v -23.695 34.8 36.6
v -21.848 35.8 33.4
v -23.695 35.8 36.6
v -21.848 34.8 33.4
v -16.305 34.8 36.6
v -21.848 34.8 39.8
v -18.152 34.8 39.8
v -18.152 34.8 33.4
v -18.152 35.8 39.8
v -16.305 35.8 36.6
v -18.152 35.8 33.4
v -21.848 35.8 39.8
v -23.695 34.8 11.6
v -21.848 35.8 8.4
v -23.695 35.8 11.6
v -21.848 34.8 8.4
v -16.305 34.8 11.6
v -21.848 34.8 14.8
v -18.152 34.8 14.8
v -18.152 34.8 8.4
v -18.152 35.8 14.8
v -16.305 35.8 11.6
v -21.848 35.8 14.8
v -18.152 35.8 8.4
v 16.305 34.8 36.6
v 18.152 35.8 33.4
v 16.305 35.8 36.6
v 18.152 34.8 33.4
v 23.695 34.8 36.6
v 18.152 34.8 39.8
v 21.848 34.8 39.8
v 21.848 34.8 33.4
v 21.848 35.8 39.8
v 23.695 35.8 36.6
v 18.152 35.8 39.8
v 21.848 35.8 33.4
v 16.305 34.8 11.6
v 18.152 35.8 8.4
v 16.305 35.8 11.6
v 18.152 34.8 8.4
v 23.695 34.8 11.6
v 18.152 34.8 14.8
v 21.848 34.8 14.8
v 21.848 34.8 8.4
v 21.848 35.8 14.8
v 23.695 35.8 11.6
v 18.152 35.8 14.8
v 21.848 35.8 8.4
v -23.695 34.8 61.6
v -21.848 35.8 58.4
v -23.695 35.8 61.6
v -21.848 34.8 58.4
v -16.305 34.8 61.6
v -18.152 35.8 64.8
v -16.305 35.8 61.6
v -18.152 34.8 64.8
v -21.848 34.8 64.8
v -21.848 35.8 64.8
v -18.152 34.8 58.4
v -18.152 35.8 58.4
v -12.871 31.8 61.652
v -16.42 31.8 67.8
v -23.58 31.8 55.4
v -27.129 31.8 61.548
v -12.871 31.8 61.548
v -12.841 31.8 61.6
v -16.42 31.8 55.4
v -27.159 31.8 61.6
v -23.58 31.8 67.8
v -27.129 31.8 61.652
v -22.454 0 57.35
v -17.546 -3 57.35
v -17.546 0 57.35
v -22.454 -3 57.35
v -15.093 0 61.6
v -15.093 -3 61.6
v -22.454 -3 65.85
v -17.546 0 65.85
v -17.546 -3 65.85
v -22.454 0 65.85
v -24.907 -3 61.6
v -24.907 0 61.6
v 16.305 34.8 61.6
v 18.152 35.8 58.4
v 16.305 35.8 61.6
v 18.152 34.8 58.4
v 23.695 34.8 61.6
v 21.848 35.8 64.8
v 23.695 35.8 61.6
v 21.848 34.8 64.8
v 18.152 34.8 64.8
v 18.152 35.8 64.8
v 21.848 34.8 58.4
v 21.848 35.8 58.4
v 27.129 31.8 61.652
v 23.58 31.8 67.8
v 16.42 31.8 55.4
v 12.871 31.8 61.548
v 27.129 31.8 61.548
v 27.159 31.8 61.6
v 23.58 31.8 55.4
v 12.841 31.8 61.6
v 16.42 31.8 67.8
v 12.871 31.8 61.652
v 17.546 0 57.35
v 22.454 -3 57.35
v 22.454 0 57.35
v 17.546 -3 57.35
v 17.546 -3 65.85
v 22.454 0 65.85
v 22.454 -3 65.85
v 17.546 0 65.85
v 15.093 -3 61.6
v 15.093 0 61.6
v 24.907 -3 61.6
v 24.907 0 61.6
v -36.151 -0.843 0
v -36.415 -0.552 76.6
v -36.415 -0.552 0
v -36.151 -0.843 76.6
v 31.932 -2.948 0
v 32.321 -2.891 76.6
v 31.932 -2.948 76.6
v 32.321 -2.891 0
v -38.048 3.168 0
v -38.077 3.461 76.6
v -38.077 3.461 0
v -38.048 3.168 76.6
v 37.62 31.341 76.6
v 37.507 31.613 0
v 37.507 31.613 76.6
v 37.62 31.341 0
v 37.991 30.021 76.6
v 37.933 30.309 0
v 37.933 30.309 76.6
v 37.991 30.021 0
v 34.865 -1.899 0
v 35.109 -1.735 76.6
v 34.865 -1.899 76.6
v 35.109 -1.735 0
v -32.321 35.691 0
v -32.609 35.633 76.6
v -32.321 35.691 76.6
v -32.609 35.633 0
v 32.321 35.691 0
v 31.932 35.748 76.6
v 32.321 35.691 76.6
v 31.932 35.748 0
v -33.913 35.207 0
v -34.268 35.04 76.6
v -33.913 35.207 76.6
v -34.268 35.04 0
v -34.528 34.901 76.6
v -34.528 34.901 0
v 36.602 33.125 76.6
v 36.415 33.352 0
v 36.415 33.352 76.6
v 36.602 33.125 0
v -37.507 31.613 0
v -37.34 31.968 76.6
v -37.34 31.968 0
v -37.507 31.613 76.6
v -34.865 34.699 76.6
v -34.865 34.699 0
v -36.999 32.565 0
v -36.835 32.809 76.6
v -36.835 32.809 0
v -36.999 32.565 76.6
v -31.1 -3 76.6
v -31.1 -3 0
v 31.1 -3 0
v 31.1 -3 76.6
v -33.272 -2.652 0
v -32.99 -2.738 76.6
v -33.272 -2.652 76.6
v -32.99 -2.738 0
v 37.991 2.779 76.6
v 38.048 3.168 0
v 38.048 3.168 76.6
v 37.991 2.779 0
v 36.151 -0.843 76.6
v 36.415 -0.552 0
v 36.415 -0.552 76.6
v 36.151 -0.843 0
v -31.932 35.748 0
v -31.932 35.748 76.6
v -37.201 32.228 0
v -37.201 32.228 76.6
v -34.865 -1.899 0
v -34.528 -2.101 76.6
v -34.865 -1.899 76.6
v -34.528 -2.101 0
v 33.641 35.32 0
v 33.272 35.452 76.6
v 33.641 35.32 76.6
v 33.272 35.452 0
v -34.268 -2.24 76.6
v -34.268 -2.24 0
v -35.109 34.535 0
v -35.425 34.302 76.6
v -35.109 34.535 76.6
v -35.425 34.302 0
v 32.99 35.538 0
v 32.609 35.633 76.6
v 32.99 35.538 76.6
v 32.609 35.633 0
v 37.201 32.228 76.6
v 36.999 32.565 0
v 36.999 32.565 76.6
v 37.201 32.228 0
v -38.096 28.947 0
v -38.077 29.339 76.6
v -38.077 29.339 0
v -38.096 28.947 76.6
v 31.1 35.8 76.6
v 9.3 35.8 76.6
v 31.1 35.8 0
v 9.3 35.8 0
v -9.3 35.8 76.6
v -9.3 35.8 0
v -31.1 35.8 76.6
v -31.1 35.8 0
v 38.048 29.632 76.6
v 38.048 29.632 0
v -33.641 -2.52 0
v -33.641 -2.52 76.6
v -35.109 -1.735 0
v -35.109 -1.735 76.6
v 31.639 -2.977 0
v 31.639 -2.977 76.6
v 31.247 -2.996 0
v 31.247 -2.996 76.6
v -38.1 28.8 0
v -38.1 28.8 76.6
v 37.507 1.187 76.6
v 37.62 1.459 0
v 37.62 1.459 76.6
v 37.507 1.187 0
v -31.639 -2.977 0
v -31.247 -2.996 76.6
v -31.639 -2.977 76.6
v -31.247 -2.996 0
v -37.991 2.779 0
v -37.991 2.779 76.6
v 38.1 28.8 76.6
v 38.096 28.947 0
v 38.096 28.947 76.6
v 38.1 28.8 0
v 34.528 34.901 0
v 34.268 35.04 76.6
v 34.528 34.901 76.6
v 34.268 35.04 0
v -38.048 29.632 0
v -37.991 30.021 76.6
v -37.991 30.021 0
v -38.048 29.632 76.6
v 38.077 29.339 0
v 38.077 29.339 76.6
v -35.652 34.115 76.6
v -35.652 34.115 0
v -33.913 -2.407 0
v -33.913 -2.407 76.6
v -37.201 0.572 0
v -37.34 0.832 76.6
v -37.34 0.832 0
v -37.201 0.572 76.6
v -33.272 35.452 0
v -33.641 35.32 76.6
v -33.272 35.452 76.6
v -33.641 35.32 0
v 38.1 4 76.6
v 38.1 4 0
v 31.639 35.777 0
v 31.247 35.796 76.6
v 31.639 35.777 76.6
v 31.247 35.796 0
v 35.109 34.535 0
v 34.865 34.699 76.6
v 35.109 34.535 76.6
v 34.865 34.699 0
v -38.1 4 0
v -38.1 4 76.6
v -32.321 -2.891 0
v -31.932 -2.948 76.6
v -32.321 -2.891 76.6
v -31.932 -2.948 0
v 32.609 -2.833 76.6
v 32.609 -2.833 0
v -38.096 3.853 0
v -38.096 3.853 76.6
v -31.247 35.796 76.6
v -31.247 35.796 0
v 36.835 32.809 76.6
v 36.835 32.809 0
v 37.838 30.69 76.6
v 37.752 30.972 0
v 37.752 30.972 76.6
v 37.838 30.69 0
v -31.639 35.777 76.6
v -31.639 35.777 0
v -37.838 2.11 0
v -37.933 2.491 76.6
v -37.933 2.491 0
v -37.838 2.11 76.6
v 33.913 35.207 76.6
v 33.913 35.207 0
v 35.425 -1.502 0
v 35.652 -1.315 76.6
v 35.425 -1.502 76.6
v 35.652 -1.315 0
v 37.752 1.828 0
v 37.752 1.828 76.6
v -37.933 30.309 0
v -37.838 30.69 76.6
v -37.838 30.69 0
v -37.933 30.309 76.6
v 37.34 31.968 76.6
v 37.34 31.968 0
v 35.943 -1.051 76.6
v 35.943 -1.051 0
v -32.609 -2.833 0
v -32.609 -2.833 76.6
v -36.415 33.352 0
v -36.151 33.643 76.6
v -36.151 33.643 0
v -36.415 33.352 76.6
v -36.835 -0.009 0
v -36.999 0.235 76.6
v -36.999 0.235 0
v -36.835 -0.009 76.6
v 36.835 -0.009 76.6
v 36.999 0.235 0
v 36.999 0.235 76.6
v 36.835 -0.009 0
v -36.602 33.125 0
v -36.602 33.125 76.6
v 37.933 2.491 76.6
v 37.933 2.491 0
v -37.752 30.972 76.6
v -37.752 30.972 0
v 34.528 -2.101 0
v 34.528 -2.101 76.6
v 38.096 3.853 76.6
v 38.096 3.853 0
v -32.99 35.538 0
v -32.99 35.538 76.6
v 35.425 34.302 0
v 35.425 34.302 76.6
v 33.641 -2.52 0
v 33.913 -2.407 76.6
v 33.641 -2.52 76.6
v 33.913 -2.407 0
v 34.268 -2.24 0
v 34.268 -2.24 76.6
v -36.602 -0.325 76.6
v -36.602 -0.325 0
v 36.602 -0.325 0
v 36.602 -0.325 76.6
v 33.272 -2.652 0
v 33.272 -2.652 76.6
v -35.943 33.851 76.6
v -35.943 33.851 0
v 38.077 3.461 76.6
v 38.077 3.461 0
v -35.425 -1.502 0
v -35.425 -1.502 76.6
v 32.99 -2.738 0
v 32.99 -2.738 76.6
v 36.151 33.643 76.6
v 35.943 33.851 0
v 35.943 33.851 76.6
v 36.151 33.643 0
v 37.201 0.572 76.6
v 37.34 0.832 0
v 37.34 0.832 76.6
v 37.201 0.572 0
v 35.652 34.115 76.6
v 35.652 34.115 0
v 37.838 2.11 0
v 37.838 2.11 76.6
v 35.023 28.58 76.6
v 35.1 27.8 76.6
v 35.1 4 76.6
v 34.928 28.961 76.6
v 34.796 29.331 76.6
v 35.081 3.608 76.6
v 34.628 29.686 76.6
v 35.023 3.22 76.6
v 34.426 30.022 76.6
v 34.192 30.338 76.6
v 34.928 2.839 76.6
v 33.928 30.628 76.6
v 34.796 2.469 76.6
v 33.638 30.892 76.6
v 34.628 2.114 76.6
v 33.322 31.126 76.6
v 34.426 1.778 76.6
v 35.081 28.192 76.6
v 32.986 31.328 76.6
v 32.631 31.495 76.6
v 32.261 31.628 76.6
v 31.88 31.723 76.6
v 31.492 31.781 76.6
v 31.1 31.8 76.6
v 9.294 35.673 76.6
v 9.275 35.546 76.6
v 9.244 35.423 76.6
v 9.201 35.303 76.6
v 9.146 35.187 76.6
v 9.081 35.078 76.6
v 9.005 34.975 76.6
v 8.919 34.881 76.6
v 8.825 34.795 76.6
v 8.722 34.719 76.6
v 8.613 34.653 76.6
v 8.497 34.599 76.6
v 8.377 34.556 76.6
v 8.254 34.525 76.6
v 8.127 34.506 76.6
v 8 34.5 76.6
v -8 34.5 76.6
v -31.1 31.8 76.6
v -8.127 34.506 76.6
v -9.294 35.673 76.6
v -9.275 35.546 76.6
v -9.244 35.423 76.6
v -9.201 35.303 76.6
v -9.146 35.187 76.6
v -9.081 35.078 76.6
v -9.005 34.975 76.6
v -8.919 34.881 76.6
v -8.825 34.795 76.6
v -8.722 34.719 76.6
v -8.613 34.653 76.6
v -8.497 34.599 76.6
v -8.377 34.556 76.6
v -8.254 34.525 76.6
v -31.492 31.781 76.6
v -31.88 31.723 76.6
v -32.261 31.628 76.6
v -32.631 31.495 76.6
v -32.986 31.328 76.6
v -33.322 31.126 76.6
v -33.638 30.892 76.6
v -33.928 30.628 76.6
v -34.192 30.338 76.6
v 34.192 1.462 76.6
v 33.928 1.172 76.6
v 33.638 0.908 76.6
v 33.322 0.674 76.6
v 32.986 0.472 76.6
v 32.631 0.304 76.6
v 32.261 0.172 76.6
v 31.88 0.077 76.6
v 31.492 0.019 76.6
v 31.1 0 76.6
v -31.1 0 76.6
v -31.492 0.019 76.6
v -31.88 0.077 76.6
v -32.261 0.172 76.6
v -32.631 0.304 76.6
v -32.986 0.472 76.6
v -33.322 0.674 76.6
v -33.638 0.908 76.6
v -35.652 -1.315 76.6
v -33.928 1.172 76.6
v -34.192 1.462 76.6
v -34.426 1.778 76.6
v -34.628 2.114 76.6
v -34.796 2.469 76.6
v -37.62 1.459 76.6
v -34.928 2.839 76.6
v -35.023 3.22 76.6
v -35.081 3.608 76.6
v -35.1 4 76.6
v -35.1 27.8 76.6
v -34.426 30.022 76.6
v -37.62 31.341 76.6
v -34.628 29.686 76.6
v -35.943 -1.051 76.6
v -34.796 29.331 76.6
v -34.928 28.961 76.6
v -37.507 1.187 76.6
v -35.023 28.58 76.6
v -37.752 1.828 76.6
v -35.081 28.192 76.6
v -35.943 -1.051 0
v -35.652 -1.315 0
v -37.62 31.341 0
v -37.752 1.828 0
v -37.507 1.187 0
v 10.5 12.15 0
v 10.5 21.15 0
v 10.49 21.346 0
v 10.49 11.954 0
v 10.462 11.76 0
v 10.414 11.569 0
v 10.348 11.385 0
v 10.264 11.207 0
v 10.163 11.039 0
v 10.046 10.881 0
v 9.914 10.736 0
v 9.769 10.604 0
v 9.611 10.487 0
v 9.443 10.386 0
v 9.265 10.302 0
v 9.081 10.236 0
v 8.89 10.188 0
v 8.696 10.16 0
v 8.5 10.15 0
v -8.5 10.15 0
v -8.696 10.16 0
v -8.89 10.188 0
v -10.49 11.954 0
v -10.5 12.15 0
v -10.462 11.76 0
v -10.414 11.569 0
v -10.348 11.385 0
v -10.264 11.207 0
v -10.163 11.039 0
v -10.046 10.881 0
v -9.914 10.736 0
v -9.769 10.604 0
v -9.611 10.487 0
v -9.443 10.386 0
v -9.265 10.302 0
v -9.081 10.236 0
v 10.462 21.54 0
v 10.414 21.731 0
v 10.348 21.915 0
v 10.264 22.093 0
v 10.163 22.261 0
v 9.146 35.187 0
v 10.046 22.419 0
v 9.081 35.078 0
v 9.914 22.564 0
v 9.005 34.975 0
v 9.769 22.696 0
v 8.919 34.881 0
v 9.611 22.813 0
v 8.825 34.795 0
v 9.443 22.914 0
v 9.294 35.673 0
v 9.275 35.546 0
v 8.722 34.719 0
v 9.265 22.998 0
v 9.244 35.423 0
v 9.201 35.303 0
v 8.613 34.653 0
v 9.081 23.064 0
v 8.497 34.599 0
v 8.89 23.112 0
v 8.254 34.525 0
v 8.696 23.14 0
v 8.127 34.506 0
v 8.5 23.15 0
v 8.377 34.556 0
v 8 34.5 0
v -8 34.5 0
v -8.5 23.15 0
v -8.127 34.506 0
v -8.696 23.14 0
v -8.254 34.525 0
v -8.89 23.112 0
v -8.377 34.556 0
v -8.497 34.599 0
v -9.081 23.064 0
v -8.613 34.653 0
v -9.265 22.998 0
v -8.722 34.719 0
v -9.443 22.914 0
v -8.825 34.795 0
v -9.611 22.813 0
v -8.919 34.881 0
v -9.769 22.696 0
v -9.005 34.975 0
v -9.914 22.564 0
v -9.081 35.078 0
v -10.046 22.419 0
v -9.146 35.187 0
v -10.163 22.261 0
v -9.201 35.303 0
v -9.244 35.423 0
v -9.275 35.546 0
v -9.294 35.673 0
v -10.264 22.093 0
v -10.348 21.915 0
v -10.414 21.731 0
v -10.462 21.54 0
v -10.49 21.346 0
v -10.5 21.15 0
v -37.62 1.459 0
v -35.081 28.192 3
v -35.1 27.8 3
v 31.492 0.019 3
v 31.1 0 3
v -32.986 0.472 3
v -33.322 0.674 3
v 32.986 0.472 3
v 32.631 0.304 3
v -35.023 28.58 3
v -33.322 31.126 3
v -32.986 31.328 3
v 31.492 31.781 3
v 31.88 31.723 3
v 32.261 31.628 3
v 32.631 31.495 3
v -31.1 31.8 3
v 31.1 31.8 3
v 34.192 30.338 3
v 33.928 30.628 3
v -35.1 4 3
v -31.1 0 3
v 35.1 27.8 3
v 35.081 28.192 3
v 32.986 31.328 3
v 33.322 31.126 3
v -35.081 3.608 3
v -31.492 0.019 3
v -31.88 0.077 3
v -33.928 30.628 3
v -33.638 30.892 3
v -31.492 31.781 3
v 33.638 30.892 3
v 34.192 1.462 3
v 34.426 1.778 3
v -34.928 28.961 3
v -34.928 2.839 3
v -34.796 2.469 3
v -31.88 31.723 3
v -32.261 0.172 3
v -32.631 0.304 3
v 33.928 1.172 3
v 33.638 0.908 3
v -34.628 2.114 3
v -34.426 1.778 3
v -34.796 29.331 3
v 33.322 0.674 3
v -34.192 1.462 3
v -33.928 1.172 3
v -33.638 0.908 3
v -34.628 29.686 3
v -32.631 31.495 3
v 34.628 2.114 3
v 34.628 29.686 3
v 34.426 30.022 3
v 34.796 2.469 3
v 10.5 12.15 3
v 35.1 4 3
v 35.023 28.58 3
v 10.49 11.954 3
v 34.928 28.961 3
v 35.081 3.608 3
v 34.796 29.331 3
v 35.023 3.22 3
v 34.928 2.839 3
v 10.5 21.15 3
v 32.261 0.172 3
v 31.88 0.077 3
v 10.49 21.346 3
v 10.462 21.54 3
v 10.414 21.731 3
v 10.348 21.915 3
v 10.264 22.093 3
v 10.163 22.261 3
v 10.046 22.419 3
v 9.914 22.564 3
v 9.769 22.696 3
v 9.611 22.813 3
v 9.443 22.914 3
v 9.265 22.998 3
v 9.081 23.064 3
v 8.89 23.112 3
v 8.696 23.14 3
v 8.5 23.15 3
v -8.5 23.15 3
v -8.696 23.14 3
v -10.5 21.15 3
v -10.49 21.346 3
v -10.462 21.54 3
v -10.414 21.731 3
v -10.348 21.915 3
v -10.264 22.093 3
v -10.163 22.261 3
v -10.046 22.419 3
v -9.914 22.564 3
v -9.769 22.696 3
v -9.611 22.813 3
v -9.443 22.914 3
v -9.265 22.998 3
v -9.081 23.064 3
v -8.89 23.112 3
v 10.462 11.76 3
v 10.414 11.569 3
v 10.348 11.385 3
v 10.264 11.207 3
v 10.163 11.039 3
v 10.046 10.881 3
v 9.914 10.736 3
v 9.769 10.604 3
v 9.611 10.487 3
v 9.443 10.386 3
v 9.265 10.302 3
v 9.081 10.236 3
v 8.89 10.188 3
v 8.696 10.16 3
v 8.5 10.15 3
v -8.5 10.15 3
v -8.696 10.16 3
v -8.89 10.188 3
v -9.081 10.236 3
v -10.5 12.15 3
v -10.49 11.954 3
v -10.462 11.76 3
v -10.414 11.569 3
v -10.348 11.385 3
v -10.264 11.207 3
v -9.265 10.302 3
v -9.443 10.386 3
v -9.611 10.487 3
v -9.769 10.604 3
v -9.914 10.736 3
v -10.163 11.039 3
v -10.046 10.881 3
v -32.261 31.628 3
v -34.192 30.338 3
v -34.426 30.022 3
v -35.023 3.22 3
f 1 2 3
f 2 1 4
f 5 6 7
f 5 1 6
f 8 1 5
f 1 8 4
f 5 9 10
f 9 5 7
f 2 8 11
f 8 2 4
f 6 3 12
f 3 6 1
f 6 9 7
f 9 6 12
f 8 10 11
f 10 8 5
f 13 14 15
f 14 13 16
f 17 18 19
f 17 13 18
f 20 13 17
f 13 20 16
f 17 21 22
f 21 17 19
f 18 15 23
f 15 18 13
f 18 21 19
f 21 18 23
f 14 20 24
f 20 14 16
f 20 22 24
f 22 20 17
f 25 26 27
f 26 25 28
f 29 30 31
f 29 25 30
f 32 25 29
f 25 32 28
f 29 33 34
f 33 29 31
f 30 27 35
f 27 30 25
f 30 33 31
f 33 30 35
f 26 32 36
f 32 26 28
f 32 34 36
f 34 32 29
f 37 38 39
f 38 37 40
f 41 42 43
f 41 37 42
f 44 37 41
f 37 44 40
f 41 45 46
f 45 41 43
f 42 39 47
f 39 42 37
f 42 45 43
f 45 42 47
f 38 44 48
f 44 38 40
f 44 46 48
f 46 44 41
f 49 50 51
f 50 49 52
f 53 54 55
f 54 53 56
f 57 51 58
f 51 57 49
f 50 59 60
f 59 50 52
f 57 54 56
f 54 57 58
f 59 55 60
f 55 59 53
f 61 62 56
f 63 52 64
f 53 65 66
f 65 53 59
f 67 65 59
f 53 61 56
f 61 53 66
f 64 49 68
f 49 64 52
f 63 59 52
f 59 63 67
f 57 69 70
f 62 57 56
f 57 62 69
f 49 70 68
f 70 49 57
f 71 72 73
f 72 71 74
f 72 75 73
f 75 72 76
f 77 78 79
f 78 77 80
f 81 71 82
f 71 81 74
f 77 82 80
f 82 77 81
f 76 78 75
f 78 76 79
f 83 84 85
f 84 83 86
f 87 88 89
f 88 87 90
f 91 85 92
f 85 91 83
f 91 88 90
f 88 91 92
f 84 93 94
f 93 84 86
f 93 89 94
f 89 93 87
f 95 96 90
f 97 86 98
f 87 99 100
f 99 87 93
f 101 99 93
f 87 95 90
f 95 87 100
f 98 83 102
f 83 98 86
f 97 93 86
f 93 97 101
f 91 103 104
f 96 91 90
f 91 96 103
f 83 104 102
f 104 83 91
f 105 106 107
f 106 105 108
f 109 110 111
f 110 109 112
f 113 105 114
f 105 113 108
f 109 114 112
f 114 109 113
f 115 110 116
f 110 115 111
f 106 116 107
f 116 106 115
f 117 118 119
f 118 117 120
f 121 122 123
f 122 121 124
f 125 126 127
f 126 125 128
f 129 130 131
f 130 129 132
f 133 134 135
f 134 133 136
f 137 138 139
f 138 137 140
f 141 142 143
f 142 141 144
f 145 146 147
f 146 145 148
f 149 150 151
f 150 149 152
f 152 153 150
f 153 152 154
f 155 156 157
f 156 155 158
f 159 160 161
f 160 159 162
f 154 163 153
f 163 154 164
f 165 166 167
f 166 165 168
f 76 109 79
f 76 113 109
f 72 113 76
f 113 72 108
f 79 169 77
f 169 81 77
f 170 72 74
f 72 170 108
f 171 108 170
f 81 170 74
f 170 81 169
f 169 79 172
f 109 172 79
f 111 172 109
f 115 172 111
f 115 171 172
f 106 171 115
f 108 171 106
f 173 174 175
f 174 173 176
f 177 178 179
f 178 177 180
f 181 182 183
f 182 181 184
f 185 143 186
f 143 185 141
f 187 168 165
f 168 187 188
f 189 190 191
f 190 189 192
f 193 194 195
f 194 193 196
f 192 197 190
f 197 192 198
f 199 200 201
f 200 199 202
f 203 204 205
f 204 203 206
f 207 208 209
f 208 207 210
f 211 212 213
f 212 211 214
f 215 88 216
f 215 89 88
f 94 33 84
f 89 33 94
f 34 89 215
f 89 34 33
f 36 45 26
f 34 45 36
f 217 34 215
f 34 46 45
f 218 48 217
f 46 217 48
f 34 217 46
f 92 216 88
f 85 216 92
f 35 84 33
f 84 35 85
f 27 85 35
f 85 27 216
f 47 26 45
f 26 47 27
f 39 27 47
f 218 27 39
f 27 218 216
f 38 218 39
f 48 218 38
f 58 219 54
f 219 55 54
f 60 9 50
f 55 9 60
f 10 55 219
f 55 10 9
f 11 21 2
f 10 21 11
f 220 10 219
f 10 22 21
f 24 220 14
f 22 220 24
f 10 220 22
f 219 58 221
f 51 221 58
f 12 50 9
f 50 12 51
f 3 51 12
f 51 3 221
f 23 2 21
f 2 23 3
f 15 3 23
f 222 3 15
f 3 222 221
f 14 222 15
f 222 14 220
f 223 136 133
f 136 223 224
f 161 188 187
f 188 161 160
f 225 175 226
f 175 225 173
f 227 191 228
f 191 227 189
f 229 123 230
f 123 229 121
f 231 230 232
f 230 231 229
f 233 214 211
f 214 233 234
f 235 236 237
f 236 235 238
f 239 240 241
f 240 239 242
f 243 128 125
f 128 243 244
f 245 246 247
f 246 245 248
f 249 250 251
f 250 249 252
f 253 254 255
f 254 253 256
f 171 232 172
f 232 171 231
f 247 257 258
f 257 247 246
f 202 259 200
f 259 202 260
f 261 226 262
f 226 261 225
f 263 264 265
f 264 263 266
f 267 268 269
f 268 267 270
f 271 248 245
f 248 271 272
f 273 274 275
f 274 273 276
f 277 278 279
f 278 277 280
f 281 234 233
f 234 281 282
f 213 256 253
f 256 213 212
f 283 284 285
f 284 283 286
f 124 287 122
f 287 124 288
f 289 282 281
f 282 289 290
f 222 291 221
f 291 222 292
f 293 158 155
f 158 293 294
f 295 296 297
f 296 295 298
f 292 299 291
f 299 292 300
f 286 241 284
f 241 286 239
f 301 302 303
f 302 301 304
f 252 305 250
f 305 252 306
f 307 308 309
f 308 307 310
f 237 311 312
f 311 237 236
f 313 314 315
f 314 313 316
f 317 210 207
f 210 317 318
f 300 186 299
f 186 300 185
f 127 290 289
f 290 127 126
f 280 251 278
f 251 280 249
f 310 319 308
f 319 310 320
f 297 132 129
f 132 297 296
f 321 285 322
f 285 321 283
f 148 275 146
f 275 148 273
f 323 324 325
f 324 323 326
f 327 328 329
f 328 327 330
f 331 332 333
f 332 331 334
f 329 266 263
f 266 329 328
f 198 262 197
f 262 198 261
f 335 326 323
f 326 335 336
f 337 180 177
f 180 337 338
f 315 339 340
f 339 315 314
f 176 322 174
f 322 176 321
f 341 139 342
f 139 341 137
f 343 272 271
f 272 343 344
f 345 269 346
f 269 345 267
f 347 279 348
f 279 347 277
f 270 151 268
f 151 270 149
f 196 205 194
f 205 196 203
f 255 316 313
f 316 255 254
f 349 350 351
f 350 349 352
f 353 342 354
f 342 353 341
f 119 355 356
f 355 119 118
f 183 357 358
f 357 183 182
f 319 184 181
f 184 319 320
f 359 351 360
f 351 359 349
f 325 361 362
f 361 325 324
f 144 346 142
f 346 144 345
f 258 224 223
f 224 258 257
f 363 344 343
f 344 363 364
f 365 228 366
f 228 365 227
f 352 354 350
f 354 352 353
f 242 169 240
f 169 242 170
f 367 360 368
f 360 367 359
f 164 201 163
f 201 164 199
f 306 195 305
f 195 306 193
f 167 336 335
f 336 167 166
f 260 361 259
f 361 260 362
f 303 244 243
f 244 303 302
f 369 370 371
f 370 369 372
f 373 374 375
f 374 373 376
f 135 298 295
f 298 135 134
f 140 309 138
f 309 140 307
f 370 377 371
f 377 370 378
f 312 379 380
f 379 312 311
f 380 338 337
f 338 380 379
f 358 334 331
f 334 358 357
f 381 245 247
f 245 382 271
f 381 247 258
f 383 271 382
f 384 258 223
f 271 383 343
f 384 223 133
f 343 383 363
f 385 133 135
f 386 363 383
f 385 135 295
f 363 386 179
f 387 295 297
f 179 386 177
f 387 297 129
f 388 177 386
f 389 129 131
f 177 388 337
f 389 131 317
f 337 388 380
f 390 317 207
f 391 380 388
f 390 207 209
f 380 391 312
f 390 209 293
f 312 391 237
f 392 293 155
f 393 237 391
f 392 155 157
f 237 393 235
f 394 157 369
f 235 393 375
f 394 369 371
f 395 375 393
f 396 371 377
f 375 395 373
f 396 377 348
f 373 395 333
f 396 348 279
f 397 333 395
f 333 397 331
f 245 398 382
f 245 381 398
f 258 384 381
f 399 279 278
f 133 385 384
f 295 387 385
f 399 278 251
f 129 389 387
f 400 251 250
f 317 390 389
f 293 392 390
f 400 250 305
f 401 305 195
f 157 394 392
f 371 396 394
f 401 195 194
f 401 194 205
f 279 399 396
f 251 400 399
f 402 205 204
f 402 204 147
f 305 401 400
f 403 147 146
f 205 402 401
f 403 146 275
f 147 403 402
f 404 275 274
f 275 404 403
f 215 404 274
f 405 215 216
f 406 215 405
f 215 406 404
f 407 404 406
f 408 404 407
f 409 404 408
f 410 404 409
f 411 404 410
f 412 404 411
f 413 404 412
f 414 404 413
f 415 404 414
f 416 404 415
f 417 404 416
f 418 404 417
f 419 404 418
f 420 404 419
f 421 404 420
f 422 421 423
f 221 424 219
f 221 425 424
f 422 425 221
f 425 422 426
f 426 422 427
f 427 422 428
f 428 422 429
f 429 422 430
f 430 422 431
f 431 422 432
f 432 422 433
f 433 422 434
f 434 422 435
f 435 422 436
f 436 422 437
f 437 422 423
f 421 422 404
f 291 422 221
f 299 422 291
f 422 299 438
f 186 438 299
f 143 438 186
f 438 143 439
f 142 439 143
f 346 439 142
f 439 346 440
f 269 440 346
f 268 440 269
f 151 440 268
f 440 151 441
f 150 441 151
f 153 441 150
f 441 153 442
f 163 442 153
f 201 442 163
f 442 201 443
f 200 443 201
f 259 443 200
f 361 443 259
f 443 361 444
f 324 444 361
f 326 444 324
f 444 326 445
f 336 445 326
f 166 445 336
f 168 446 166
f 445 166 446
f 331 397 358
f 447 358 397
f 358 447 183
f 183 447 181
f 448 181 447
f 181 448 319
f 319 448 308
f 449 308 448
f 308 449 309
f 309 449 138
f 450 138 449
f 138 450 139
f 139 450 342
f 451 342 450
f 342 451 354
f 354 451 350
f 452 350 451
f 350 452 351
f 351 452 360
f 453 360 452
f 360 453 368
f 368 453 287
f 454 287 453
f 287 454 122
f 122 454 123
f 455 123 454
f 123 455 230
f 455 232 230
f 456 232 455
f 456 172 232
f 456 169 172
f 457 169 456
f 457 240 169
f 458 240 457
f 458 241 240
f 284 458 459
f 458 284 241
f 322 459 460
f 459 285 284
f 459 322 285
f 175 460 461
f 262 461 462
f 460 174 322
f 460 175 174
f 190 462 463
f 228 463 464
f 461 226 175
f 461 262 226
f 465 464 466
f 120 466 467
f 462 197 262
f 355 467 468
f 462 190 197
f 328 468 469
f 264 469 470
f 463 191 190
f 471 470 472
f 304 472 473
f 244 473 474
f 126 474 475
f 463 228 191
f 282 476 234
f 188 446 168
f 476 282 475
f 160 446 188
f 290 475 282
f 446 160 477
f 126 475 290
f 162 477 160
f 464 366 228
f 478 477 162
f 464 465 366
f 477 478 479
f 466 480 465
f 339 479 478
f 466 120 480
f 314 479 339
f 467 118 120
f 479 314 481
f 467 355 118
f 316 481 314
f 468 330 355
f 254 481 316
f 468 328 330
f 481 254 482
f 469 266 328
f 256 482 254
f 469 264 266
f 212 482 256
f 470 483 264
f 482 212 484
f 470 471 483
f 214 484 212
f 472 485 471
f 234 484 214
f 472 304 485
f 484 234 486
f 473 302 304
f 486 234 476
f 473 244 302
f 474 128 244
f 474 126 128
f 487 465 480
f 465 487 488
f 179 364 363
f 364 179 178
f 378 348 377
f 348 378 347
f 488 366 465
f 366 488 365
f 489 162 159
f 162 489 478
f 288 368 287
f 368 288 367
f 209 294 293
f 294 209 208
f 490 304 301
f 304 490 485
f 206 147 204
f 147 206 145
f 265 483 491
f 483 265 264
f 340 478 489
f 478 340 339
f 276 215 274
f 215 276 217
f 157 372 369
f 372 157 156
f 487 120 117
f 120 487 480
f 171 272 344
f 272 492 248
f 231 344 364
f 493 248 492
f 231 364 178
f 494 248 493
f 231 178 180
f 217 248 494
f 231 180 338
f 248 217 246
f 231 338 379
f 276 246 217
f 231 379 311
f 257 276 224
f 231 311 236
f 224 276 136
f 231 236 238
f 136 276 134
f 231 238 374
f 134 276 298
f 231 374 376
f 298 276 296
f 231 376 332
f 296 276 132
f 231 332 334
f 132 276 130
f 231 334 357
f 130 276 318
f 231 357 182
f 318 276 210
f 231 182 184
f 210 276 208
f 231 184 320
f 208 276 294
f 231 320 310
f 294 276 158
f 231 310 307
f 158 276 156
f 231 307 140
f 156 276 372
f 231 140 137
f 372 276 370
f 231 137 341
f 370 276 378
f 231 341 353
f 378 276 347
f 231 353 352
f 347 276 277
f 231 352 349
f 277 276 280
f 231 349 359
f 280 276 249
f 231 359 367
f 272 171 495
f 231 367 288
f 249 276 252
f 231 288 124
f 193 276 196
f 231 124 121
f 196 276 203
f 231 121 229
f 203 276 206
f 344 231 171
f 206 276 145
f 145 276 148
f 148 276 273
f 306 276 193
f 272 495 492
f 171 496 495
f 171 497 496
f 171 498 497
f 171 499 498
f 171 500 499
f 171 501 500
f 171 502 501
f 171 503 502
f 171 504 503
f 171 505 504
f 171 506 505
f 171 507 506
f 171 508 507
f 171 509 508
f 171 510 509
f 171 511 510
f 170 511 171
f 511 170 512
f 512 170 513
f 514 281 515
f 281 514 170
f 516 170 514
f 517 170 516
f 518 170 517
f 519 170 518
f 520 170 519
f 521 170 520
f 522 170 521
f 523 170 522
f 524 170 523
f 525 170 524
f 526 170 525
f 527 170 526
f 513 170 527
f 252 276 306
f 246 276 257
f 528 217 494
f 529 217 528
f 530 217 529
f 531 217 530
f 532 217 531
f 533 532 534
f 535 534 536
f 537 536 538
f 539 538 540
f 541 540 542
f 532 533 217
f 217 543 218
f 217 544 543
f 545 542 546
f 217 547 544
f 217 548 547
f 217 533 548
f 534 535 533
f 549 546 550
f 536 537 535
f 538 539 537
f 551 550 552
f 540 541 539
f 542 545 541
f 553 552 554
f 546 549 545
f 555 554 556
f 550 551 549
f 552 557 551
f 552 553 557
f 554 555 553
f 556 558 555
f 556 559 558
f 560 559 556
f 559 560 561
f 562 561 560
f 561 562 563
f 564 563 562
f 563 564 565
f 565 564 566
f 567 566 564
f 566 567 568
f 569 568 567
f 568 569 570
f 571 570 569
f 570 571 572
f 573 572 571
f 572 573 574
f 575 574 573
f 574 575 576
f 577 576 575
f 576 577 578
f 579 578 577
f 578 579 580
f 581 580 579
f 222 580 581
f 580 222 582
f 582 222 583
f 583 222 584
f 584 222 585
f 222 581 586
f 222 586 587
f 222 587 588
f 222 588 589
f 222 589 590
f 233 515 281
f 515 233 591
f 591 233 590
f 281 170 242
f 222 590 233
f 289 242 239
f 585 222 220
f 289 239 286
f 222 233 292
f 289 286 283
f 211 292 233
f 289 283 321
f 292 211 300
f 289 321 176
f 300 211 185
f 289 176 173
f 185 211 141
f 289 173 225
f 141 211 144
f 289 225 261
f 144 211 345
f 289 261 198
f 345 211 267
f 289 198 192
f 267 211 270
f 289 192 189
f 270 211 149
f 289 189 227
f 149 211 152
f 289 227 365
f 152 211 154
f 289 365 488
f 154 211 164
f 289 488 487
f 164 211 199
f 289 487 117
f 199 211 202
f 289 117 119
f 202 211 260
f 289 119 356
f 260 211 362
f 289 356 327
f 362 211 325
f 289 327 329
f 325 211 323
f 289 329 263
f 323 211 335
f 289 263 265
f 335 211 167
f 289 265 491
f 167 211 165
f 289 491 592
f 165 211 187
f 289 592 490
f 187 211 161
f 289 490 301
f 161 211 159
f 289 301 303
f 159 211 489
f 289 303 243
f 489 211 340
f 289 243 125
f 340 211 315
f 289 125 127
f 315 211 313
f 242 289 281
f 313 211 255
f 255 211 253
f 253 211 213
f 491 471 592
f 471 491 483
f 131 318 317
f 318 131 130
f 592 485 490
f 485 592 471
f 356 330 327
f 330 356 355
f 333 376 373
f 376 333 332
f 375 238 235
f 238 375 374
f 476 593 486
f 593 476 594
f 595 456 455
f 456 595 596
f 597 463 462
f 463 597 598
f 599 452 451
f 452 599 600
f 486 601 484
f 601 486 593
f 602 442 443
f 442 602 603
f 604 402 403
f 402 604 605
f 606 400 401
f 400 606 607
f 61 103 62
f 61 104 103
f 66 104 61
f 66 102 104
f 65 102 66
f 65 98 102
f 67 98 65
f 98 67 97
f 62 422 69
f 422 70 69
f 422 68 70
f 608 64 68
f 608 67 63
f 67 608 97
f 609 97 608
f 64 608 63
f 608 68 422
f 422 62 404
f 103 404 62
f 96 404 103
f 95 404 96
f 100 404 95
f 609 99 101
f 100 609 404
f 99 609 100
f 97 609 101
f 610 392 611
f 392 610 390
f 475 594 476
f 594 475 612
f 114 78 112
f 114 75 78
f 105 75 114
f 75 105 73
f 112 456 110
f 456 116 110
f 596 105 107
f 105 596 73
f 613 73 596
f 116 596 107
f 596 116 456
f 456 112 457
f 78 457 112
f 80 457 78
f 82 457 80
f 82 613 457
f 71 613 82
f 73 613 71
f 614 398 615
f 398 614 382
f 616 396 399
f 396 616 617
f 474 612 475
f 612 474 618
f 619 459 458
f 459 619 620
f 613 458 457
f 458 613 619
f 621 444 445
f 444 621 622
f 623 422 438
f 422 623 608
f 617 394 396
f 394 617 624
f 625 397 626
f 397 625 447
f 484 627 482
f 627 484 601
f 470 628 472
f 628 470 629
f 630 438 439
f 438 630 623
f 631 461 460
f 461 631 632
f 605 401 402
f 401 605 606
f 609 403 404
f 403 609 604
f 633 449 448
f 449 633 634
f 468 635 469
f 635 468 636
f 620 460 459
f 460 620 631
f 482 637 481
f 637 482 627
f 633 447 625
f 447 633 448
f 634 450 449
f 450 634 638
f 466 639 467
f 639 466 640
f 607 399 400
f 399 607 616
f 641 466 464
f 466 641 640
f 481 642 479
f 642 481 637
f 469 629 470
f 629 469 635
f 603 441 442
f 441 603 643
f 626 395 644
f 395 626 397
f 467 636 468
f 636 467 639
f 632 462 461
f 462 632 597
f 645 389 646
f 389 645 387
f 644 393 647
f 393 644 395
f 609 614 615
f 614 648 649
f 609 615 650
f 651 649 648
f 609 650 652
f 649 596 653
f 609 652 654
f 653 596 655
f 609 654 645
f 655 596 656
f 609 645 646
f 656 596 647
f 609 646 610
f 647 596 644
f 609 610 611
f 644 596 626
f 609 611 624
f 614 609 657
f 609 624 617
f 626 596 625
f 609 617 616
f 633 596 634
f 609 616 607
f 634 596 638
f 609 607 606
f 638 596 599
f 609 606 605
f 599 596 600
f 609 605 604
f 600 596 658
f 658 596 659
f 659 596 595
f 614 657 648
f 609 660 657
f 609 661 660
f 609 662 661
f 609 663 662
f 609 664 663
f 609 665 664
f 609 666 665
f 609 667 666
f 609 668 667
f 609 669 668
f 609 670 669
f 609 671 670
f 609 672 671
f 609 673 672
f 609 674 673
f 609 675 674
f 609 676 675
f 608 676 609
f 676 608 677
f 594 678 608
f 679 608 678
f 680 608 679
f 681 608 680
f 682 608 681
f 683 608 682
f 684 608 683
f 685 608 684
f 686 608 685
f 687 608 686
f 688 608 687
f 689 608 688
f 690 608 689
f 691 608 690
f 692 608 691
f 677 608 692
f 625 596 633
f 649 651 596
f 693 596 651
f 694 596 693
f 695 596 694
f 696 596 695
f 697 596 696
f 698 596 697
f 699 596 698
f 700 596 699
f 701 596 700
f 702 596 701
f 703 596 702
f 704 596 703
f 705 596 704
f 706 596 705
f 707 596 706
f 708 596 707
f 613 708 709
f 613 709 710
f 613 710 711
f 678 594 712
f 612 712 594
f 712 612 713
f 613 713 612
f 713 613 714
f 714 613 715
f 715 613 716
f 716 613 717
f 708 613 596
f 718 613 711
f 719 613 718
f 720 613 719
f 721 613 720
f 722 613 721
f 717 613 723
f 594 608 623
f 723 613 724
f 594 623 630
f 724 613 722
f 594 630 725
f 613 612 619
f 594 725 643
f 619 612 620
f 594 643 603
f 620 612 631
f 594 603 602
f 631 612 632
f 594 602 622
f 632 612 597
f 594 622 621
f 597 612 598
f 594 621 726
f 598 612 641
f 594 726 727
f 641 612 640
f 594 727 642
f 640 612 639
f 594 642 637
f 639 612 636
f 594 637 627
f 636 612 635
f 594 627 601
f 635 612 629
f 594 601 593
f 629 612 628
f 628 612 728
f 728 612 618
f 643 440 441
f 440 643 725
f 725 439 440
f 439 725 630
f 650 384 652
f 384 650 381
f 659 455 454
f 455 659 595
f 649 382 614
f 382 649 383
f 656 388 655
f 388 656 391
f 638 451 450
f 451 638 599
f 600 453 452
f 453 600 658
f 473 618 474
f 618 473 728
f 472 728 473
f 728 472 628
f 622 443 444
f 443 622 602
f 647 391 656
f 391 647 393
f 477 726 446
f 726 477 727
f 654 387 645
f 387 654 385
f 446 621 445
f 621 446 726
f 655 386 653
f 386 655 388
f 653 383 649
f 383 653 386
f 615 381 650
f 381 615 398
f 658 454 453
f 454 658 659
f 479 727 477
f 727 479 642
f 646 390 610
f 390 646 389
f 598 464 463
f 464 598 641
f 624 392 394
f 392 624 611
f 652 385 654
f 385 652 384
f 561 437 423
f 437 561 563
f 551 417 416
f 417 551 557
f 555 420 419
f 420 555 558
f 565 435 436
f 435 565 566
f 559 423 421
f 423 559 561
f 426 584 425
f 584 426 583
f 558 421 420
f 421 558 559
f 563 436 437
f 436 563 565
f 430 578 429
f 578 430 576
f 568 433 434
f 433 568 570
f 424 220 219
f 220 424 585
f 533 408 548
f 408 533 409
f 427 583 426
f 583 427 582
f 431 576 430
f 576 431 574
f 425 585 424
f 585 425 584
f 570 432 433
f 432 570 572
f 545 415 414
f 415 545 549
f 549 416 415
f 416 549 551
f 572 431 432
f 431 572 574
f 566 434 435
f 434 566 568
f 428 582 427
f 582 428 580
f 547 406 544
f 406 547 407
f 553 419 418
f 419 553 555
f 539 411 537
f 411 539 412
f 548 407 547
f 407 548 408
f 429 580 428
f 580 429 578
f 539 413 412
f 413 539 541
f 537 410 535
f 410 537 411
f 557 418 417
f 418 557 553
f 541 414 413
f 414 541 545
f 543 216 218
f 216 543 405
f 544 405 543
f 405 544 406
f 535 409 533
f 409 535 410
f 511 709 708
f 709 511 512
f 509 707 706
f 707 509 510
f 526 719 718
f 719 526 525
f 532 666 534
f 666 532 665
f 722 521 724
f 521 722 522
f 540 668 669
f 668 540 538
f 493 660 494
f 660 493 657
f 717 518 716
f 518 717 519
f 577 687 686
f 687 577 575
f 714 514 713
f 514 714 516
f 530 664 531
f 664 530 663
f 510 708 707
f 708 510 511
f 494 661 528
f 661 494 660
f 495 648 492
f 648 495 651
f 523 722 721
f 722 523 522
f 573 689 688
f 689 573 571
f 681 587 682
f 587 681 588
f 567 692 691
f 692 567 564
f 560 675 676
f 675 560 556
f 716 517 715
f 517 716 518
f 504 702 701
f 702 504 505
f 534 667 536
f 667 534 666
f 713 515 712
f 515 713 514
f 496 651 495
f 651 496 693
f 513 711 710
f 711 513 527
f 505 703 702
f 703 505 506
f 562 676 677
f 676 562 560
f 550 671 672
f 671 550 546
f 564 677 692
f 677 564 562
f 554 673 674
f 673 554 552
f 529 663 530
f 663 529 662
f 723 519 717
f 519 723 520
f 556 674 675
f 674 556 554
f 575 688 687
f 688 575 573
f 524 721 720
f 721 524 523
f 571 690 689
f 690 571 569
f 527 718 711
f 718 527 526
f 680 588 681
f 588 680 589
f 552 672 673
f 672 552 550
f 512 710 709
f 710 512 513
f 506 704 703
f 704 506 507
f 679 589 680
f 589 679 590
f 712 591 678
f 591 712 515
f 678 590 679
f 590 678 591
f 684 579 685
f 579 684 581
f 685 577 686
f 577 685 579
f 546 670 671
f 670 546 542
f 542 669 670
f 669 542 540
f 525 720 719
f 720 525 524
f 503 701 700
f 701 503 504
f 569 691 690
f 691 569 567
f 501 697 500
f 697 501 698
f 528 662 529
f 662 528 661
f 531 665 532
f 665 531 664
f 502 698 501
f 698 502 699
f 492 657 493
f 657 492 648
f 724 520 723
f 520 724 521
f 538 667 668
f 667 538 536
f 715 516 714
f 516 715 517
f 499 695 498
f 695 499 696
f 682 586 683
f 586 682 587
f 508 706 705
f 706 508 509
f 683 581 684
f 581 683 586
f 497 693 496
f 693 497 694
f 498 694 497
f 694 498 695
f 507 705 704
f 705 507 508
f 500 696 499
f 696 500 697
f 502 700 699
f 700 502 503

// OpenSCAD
// file: ../../../modules/bolts.scad
module nut_trap(d, h, center = true) {
  linear_extrude(height = h, center = center)
  circle(d = d / cos(30), $fn = 6);
}

module bolt_hole(d, h, center = true) {
  linear_extrude(height = h, center = center)
  circle(d = d, $fn = 64);
}

// Hex holes for self-tapping (nominal - 0.2mm)
module hex_hole(flat_d, h) {
  linear_extrude(height = h, center = true)
  circle(d = flat_d / cos(30), $fn = 6);
}

module m3_bolt_hexhole(h) {
  rotate([0, 0, 90]) hex_hole(flat_d = 2.8, h = h);
}

module m4_bolt_hexhole(h) {
  rotate([0, 0, 90]) hex_hole(flat_d = 3.8, h = h);
}

module m6_bolt_hexhole(h) {
  rotate([0, 0, 90]) hex_hole(flat_d = 5.8, h = h);
}

module m8_bolt_hexhole(h) {
  rotate([0, 0, 90]) hex_hole(flat_d = 7.8, h = h);
}

// M3
module m3_bolt_hole(h, center = false) { bolt_hole(d = 3.4, h = h, center = center); }
module m3_nut_trap(h, center = false) { nut_trap(d = 5.7, h = h, center = center); }

// M4
module m4_bolt_hole(h, center = false) { bolt_hole(d = 4.4, h = h, center = center); }
module m4_nut_trap(h, center = false) { nut_trap(d = 7.5, h = h, center = center); }

// M6
module m6_bolt_hole(h, center = false) { bolt_hole(d = 6.2, h = h, center = center); }
module m6_nut_trap(h, center = false) { nut_trap(d = 10.2, h = h, center = center); }

// M8
module m8_bolt_hole(h, center = false) { bolt_hole(d = 8.4, h = h, center = center); }
module m8_nut_trap(h, center = false) { nut_trap(d = 13.3, h = h, center = center); }
// main file
use <../../../modules/bolts.scad>

// X=左右中心、Y=内側前端(工具側)、+Y=クランプ側、Z=底面。
charger_w = 69.2;
charger_d = 30.8;
charger_h = 73.6;
clearance = 1; // 幅・奥行きそれぞれの総クリアランス
inner_r = 4;
wall = 3;
mount_wall = 4;
floor_t = 3;

mount_pitch = 40;
mount_row_pitch = 25;
mount_from_top = 15; // 未実測の仮値。穴中心から上端まで
screw_flat = 6.4;
head_flat = 12.4; // 皿頭未実測の仮値 (対辺)
head_depth = 3;
driver_flat = 8.5;
tip_depth = 1;
rib_w = 16;
rib_depth = 1.3;
rib_r = 1.3;

jack_w = 17;
jack_d = 9;
jack_front = 11;
jack_back = 9.5;
jack_margin = 2; // 四方へそれぞれ追加
jack_r = 2;
arc_fn = 64;
eps = 0.05;

inner_w = charger_w + clearance;
inner_d = charger_d + clearance;
height = charger_h + floor_t;
mount_z = height - mount_from_top;
mount_y = inner_d + mount_wall;
// 両側の測定から推定した中心を平均し、前側のクリアランス半分を加える。
jack_y = (jack_front + jack_d / 2 + charger_d - jack_back - jack_d / 2) / 2 + clearance / 2;
head_slope = (head_flat - screw_flat) / head_depth;

module cavity_2d() {
  translate([-inner_w / 2 + inner_r, inner_r])
    offset(r = inner_r, $fn = arc_fn)
      square([inner_w - 2 * inner_r, inner_d - 2 * inner_r]);
}

module outline_2d() {
  offset(r = wall, $fn = arc_fn) hull() {
    cavity_2d();
    translate([0, mount_wall - wall]) cavity_2d();
  }
}

// 軸は+Y。開始面の対辺aから、長さhで対辺bへ絞る。
module hex_taper_y(a, b, h) {
  rotate([-90, 0, 0]) linear_extrude(height = h, scale = b / a)
    circle(d = a / cos(30), $fn = 6);
}

module lx_charger_holder() {
  assert(mount_wall >= wall && head_depth > 0 && head_depth < mount_wall);
  assert(head_flat > screw_flat && driver_flat > 6.35 / cos(30));
  assert(mount_from_top > max(head_flat, driver_flat) / 2);
  assert(mount_z - max(head_flat, driver_flat) / 2 > floor_t);
  difference() {
    linear_extrude(height = height) outline_2d();
    translate([0, 0, floor_t]) linear_extrude(height = charger_h + eps) cavity_2d();

    // 中央16×1.3を全高で逃がす。Rの肉が逃げを狭めないよう左右へ広げる。
    // 入口幅は16+2*1.3=18.6、中央の残肉は4-1.3=2.7。
    translate([-rib_w / 2, mount_y - rib_depth + rib_r, -eps])
      linear_extrude(height = height + 2 * eps)
        offset(r = rib_r, $fn = arc_fn) square([rib_w, rib_depth + eps]);

    // 底穴は21×13の角丸矩形。くびれを作らずプラグの通り道を確保する。
    translate([-jack_w / 2 - jack_margin + jack_r,
               jack_y - jack_d / 2 - jack_margin + jack_r, -eps])
      linear_extrude(height = floor_t + 2 * eps)
        offset(r = jack_r, $fn = arc_fn)
          square([jack_w + 2 * jack_margin - 2 * jack_r,
                  jack_d + 2 * jack_margin - 2 * jack_r]);

    for (x = [-mount_pitch / 2, mount_pitch / 2]) {
      translate([x, inner_d + mount_wall / 2, mount_z])
        rotate([-90, 0, 0]) hex_hole(screw_flat, mount_wall + 2 * eps);
      // 皿座は充電器側の面。クランプ接触面側は通し穴のまま1mm残す。
      translate([x, inner_d - eps, mount_z])
        hex_taper_y(head_flat + eps * head_slope, screw_flat, head_depth + eps);
      translate([x, -wall / 2, mount_z])
        rotate([-90, 0, 0]) hex_hole(driver_flat, wall + 2 * eps);
      // 最上段を固定に使用。残る中・下段はクランプ側から深さ1mmの止まり穴。
      for (row = [1, 2])
        translate([x, mount_y - tip_depth, mount_z - row * mount_row_pitch])
          hex_taper_y(screw_flat, screw_flat, tip_depth + eps);
    }
  }
}

echo(str("CONTRACT lx_holder: inner = ", [inner_w, inner_d, charger_h]));
echo(str("CONTRACT lx_holder: mount = ", [mount_pitch, screw_flat, mount_z]));
echo(str("CONTRACT lx_holder: jack = ", [jack_w + 2 * jack_margin, jack_d + 2 * jack_margin, jack_y]));
lx_charger_holder();
